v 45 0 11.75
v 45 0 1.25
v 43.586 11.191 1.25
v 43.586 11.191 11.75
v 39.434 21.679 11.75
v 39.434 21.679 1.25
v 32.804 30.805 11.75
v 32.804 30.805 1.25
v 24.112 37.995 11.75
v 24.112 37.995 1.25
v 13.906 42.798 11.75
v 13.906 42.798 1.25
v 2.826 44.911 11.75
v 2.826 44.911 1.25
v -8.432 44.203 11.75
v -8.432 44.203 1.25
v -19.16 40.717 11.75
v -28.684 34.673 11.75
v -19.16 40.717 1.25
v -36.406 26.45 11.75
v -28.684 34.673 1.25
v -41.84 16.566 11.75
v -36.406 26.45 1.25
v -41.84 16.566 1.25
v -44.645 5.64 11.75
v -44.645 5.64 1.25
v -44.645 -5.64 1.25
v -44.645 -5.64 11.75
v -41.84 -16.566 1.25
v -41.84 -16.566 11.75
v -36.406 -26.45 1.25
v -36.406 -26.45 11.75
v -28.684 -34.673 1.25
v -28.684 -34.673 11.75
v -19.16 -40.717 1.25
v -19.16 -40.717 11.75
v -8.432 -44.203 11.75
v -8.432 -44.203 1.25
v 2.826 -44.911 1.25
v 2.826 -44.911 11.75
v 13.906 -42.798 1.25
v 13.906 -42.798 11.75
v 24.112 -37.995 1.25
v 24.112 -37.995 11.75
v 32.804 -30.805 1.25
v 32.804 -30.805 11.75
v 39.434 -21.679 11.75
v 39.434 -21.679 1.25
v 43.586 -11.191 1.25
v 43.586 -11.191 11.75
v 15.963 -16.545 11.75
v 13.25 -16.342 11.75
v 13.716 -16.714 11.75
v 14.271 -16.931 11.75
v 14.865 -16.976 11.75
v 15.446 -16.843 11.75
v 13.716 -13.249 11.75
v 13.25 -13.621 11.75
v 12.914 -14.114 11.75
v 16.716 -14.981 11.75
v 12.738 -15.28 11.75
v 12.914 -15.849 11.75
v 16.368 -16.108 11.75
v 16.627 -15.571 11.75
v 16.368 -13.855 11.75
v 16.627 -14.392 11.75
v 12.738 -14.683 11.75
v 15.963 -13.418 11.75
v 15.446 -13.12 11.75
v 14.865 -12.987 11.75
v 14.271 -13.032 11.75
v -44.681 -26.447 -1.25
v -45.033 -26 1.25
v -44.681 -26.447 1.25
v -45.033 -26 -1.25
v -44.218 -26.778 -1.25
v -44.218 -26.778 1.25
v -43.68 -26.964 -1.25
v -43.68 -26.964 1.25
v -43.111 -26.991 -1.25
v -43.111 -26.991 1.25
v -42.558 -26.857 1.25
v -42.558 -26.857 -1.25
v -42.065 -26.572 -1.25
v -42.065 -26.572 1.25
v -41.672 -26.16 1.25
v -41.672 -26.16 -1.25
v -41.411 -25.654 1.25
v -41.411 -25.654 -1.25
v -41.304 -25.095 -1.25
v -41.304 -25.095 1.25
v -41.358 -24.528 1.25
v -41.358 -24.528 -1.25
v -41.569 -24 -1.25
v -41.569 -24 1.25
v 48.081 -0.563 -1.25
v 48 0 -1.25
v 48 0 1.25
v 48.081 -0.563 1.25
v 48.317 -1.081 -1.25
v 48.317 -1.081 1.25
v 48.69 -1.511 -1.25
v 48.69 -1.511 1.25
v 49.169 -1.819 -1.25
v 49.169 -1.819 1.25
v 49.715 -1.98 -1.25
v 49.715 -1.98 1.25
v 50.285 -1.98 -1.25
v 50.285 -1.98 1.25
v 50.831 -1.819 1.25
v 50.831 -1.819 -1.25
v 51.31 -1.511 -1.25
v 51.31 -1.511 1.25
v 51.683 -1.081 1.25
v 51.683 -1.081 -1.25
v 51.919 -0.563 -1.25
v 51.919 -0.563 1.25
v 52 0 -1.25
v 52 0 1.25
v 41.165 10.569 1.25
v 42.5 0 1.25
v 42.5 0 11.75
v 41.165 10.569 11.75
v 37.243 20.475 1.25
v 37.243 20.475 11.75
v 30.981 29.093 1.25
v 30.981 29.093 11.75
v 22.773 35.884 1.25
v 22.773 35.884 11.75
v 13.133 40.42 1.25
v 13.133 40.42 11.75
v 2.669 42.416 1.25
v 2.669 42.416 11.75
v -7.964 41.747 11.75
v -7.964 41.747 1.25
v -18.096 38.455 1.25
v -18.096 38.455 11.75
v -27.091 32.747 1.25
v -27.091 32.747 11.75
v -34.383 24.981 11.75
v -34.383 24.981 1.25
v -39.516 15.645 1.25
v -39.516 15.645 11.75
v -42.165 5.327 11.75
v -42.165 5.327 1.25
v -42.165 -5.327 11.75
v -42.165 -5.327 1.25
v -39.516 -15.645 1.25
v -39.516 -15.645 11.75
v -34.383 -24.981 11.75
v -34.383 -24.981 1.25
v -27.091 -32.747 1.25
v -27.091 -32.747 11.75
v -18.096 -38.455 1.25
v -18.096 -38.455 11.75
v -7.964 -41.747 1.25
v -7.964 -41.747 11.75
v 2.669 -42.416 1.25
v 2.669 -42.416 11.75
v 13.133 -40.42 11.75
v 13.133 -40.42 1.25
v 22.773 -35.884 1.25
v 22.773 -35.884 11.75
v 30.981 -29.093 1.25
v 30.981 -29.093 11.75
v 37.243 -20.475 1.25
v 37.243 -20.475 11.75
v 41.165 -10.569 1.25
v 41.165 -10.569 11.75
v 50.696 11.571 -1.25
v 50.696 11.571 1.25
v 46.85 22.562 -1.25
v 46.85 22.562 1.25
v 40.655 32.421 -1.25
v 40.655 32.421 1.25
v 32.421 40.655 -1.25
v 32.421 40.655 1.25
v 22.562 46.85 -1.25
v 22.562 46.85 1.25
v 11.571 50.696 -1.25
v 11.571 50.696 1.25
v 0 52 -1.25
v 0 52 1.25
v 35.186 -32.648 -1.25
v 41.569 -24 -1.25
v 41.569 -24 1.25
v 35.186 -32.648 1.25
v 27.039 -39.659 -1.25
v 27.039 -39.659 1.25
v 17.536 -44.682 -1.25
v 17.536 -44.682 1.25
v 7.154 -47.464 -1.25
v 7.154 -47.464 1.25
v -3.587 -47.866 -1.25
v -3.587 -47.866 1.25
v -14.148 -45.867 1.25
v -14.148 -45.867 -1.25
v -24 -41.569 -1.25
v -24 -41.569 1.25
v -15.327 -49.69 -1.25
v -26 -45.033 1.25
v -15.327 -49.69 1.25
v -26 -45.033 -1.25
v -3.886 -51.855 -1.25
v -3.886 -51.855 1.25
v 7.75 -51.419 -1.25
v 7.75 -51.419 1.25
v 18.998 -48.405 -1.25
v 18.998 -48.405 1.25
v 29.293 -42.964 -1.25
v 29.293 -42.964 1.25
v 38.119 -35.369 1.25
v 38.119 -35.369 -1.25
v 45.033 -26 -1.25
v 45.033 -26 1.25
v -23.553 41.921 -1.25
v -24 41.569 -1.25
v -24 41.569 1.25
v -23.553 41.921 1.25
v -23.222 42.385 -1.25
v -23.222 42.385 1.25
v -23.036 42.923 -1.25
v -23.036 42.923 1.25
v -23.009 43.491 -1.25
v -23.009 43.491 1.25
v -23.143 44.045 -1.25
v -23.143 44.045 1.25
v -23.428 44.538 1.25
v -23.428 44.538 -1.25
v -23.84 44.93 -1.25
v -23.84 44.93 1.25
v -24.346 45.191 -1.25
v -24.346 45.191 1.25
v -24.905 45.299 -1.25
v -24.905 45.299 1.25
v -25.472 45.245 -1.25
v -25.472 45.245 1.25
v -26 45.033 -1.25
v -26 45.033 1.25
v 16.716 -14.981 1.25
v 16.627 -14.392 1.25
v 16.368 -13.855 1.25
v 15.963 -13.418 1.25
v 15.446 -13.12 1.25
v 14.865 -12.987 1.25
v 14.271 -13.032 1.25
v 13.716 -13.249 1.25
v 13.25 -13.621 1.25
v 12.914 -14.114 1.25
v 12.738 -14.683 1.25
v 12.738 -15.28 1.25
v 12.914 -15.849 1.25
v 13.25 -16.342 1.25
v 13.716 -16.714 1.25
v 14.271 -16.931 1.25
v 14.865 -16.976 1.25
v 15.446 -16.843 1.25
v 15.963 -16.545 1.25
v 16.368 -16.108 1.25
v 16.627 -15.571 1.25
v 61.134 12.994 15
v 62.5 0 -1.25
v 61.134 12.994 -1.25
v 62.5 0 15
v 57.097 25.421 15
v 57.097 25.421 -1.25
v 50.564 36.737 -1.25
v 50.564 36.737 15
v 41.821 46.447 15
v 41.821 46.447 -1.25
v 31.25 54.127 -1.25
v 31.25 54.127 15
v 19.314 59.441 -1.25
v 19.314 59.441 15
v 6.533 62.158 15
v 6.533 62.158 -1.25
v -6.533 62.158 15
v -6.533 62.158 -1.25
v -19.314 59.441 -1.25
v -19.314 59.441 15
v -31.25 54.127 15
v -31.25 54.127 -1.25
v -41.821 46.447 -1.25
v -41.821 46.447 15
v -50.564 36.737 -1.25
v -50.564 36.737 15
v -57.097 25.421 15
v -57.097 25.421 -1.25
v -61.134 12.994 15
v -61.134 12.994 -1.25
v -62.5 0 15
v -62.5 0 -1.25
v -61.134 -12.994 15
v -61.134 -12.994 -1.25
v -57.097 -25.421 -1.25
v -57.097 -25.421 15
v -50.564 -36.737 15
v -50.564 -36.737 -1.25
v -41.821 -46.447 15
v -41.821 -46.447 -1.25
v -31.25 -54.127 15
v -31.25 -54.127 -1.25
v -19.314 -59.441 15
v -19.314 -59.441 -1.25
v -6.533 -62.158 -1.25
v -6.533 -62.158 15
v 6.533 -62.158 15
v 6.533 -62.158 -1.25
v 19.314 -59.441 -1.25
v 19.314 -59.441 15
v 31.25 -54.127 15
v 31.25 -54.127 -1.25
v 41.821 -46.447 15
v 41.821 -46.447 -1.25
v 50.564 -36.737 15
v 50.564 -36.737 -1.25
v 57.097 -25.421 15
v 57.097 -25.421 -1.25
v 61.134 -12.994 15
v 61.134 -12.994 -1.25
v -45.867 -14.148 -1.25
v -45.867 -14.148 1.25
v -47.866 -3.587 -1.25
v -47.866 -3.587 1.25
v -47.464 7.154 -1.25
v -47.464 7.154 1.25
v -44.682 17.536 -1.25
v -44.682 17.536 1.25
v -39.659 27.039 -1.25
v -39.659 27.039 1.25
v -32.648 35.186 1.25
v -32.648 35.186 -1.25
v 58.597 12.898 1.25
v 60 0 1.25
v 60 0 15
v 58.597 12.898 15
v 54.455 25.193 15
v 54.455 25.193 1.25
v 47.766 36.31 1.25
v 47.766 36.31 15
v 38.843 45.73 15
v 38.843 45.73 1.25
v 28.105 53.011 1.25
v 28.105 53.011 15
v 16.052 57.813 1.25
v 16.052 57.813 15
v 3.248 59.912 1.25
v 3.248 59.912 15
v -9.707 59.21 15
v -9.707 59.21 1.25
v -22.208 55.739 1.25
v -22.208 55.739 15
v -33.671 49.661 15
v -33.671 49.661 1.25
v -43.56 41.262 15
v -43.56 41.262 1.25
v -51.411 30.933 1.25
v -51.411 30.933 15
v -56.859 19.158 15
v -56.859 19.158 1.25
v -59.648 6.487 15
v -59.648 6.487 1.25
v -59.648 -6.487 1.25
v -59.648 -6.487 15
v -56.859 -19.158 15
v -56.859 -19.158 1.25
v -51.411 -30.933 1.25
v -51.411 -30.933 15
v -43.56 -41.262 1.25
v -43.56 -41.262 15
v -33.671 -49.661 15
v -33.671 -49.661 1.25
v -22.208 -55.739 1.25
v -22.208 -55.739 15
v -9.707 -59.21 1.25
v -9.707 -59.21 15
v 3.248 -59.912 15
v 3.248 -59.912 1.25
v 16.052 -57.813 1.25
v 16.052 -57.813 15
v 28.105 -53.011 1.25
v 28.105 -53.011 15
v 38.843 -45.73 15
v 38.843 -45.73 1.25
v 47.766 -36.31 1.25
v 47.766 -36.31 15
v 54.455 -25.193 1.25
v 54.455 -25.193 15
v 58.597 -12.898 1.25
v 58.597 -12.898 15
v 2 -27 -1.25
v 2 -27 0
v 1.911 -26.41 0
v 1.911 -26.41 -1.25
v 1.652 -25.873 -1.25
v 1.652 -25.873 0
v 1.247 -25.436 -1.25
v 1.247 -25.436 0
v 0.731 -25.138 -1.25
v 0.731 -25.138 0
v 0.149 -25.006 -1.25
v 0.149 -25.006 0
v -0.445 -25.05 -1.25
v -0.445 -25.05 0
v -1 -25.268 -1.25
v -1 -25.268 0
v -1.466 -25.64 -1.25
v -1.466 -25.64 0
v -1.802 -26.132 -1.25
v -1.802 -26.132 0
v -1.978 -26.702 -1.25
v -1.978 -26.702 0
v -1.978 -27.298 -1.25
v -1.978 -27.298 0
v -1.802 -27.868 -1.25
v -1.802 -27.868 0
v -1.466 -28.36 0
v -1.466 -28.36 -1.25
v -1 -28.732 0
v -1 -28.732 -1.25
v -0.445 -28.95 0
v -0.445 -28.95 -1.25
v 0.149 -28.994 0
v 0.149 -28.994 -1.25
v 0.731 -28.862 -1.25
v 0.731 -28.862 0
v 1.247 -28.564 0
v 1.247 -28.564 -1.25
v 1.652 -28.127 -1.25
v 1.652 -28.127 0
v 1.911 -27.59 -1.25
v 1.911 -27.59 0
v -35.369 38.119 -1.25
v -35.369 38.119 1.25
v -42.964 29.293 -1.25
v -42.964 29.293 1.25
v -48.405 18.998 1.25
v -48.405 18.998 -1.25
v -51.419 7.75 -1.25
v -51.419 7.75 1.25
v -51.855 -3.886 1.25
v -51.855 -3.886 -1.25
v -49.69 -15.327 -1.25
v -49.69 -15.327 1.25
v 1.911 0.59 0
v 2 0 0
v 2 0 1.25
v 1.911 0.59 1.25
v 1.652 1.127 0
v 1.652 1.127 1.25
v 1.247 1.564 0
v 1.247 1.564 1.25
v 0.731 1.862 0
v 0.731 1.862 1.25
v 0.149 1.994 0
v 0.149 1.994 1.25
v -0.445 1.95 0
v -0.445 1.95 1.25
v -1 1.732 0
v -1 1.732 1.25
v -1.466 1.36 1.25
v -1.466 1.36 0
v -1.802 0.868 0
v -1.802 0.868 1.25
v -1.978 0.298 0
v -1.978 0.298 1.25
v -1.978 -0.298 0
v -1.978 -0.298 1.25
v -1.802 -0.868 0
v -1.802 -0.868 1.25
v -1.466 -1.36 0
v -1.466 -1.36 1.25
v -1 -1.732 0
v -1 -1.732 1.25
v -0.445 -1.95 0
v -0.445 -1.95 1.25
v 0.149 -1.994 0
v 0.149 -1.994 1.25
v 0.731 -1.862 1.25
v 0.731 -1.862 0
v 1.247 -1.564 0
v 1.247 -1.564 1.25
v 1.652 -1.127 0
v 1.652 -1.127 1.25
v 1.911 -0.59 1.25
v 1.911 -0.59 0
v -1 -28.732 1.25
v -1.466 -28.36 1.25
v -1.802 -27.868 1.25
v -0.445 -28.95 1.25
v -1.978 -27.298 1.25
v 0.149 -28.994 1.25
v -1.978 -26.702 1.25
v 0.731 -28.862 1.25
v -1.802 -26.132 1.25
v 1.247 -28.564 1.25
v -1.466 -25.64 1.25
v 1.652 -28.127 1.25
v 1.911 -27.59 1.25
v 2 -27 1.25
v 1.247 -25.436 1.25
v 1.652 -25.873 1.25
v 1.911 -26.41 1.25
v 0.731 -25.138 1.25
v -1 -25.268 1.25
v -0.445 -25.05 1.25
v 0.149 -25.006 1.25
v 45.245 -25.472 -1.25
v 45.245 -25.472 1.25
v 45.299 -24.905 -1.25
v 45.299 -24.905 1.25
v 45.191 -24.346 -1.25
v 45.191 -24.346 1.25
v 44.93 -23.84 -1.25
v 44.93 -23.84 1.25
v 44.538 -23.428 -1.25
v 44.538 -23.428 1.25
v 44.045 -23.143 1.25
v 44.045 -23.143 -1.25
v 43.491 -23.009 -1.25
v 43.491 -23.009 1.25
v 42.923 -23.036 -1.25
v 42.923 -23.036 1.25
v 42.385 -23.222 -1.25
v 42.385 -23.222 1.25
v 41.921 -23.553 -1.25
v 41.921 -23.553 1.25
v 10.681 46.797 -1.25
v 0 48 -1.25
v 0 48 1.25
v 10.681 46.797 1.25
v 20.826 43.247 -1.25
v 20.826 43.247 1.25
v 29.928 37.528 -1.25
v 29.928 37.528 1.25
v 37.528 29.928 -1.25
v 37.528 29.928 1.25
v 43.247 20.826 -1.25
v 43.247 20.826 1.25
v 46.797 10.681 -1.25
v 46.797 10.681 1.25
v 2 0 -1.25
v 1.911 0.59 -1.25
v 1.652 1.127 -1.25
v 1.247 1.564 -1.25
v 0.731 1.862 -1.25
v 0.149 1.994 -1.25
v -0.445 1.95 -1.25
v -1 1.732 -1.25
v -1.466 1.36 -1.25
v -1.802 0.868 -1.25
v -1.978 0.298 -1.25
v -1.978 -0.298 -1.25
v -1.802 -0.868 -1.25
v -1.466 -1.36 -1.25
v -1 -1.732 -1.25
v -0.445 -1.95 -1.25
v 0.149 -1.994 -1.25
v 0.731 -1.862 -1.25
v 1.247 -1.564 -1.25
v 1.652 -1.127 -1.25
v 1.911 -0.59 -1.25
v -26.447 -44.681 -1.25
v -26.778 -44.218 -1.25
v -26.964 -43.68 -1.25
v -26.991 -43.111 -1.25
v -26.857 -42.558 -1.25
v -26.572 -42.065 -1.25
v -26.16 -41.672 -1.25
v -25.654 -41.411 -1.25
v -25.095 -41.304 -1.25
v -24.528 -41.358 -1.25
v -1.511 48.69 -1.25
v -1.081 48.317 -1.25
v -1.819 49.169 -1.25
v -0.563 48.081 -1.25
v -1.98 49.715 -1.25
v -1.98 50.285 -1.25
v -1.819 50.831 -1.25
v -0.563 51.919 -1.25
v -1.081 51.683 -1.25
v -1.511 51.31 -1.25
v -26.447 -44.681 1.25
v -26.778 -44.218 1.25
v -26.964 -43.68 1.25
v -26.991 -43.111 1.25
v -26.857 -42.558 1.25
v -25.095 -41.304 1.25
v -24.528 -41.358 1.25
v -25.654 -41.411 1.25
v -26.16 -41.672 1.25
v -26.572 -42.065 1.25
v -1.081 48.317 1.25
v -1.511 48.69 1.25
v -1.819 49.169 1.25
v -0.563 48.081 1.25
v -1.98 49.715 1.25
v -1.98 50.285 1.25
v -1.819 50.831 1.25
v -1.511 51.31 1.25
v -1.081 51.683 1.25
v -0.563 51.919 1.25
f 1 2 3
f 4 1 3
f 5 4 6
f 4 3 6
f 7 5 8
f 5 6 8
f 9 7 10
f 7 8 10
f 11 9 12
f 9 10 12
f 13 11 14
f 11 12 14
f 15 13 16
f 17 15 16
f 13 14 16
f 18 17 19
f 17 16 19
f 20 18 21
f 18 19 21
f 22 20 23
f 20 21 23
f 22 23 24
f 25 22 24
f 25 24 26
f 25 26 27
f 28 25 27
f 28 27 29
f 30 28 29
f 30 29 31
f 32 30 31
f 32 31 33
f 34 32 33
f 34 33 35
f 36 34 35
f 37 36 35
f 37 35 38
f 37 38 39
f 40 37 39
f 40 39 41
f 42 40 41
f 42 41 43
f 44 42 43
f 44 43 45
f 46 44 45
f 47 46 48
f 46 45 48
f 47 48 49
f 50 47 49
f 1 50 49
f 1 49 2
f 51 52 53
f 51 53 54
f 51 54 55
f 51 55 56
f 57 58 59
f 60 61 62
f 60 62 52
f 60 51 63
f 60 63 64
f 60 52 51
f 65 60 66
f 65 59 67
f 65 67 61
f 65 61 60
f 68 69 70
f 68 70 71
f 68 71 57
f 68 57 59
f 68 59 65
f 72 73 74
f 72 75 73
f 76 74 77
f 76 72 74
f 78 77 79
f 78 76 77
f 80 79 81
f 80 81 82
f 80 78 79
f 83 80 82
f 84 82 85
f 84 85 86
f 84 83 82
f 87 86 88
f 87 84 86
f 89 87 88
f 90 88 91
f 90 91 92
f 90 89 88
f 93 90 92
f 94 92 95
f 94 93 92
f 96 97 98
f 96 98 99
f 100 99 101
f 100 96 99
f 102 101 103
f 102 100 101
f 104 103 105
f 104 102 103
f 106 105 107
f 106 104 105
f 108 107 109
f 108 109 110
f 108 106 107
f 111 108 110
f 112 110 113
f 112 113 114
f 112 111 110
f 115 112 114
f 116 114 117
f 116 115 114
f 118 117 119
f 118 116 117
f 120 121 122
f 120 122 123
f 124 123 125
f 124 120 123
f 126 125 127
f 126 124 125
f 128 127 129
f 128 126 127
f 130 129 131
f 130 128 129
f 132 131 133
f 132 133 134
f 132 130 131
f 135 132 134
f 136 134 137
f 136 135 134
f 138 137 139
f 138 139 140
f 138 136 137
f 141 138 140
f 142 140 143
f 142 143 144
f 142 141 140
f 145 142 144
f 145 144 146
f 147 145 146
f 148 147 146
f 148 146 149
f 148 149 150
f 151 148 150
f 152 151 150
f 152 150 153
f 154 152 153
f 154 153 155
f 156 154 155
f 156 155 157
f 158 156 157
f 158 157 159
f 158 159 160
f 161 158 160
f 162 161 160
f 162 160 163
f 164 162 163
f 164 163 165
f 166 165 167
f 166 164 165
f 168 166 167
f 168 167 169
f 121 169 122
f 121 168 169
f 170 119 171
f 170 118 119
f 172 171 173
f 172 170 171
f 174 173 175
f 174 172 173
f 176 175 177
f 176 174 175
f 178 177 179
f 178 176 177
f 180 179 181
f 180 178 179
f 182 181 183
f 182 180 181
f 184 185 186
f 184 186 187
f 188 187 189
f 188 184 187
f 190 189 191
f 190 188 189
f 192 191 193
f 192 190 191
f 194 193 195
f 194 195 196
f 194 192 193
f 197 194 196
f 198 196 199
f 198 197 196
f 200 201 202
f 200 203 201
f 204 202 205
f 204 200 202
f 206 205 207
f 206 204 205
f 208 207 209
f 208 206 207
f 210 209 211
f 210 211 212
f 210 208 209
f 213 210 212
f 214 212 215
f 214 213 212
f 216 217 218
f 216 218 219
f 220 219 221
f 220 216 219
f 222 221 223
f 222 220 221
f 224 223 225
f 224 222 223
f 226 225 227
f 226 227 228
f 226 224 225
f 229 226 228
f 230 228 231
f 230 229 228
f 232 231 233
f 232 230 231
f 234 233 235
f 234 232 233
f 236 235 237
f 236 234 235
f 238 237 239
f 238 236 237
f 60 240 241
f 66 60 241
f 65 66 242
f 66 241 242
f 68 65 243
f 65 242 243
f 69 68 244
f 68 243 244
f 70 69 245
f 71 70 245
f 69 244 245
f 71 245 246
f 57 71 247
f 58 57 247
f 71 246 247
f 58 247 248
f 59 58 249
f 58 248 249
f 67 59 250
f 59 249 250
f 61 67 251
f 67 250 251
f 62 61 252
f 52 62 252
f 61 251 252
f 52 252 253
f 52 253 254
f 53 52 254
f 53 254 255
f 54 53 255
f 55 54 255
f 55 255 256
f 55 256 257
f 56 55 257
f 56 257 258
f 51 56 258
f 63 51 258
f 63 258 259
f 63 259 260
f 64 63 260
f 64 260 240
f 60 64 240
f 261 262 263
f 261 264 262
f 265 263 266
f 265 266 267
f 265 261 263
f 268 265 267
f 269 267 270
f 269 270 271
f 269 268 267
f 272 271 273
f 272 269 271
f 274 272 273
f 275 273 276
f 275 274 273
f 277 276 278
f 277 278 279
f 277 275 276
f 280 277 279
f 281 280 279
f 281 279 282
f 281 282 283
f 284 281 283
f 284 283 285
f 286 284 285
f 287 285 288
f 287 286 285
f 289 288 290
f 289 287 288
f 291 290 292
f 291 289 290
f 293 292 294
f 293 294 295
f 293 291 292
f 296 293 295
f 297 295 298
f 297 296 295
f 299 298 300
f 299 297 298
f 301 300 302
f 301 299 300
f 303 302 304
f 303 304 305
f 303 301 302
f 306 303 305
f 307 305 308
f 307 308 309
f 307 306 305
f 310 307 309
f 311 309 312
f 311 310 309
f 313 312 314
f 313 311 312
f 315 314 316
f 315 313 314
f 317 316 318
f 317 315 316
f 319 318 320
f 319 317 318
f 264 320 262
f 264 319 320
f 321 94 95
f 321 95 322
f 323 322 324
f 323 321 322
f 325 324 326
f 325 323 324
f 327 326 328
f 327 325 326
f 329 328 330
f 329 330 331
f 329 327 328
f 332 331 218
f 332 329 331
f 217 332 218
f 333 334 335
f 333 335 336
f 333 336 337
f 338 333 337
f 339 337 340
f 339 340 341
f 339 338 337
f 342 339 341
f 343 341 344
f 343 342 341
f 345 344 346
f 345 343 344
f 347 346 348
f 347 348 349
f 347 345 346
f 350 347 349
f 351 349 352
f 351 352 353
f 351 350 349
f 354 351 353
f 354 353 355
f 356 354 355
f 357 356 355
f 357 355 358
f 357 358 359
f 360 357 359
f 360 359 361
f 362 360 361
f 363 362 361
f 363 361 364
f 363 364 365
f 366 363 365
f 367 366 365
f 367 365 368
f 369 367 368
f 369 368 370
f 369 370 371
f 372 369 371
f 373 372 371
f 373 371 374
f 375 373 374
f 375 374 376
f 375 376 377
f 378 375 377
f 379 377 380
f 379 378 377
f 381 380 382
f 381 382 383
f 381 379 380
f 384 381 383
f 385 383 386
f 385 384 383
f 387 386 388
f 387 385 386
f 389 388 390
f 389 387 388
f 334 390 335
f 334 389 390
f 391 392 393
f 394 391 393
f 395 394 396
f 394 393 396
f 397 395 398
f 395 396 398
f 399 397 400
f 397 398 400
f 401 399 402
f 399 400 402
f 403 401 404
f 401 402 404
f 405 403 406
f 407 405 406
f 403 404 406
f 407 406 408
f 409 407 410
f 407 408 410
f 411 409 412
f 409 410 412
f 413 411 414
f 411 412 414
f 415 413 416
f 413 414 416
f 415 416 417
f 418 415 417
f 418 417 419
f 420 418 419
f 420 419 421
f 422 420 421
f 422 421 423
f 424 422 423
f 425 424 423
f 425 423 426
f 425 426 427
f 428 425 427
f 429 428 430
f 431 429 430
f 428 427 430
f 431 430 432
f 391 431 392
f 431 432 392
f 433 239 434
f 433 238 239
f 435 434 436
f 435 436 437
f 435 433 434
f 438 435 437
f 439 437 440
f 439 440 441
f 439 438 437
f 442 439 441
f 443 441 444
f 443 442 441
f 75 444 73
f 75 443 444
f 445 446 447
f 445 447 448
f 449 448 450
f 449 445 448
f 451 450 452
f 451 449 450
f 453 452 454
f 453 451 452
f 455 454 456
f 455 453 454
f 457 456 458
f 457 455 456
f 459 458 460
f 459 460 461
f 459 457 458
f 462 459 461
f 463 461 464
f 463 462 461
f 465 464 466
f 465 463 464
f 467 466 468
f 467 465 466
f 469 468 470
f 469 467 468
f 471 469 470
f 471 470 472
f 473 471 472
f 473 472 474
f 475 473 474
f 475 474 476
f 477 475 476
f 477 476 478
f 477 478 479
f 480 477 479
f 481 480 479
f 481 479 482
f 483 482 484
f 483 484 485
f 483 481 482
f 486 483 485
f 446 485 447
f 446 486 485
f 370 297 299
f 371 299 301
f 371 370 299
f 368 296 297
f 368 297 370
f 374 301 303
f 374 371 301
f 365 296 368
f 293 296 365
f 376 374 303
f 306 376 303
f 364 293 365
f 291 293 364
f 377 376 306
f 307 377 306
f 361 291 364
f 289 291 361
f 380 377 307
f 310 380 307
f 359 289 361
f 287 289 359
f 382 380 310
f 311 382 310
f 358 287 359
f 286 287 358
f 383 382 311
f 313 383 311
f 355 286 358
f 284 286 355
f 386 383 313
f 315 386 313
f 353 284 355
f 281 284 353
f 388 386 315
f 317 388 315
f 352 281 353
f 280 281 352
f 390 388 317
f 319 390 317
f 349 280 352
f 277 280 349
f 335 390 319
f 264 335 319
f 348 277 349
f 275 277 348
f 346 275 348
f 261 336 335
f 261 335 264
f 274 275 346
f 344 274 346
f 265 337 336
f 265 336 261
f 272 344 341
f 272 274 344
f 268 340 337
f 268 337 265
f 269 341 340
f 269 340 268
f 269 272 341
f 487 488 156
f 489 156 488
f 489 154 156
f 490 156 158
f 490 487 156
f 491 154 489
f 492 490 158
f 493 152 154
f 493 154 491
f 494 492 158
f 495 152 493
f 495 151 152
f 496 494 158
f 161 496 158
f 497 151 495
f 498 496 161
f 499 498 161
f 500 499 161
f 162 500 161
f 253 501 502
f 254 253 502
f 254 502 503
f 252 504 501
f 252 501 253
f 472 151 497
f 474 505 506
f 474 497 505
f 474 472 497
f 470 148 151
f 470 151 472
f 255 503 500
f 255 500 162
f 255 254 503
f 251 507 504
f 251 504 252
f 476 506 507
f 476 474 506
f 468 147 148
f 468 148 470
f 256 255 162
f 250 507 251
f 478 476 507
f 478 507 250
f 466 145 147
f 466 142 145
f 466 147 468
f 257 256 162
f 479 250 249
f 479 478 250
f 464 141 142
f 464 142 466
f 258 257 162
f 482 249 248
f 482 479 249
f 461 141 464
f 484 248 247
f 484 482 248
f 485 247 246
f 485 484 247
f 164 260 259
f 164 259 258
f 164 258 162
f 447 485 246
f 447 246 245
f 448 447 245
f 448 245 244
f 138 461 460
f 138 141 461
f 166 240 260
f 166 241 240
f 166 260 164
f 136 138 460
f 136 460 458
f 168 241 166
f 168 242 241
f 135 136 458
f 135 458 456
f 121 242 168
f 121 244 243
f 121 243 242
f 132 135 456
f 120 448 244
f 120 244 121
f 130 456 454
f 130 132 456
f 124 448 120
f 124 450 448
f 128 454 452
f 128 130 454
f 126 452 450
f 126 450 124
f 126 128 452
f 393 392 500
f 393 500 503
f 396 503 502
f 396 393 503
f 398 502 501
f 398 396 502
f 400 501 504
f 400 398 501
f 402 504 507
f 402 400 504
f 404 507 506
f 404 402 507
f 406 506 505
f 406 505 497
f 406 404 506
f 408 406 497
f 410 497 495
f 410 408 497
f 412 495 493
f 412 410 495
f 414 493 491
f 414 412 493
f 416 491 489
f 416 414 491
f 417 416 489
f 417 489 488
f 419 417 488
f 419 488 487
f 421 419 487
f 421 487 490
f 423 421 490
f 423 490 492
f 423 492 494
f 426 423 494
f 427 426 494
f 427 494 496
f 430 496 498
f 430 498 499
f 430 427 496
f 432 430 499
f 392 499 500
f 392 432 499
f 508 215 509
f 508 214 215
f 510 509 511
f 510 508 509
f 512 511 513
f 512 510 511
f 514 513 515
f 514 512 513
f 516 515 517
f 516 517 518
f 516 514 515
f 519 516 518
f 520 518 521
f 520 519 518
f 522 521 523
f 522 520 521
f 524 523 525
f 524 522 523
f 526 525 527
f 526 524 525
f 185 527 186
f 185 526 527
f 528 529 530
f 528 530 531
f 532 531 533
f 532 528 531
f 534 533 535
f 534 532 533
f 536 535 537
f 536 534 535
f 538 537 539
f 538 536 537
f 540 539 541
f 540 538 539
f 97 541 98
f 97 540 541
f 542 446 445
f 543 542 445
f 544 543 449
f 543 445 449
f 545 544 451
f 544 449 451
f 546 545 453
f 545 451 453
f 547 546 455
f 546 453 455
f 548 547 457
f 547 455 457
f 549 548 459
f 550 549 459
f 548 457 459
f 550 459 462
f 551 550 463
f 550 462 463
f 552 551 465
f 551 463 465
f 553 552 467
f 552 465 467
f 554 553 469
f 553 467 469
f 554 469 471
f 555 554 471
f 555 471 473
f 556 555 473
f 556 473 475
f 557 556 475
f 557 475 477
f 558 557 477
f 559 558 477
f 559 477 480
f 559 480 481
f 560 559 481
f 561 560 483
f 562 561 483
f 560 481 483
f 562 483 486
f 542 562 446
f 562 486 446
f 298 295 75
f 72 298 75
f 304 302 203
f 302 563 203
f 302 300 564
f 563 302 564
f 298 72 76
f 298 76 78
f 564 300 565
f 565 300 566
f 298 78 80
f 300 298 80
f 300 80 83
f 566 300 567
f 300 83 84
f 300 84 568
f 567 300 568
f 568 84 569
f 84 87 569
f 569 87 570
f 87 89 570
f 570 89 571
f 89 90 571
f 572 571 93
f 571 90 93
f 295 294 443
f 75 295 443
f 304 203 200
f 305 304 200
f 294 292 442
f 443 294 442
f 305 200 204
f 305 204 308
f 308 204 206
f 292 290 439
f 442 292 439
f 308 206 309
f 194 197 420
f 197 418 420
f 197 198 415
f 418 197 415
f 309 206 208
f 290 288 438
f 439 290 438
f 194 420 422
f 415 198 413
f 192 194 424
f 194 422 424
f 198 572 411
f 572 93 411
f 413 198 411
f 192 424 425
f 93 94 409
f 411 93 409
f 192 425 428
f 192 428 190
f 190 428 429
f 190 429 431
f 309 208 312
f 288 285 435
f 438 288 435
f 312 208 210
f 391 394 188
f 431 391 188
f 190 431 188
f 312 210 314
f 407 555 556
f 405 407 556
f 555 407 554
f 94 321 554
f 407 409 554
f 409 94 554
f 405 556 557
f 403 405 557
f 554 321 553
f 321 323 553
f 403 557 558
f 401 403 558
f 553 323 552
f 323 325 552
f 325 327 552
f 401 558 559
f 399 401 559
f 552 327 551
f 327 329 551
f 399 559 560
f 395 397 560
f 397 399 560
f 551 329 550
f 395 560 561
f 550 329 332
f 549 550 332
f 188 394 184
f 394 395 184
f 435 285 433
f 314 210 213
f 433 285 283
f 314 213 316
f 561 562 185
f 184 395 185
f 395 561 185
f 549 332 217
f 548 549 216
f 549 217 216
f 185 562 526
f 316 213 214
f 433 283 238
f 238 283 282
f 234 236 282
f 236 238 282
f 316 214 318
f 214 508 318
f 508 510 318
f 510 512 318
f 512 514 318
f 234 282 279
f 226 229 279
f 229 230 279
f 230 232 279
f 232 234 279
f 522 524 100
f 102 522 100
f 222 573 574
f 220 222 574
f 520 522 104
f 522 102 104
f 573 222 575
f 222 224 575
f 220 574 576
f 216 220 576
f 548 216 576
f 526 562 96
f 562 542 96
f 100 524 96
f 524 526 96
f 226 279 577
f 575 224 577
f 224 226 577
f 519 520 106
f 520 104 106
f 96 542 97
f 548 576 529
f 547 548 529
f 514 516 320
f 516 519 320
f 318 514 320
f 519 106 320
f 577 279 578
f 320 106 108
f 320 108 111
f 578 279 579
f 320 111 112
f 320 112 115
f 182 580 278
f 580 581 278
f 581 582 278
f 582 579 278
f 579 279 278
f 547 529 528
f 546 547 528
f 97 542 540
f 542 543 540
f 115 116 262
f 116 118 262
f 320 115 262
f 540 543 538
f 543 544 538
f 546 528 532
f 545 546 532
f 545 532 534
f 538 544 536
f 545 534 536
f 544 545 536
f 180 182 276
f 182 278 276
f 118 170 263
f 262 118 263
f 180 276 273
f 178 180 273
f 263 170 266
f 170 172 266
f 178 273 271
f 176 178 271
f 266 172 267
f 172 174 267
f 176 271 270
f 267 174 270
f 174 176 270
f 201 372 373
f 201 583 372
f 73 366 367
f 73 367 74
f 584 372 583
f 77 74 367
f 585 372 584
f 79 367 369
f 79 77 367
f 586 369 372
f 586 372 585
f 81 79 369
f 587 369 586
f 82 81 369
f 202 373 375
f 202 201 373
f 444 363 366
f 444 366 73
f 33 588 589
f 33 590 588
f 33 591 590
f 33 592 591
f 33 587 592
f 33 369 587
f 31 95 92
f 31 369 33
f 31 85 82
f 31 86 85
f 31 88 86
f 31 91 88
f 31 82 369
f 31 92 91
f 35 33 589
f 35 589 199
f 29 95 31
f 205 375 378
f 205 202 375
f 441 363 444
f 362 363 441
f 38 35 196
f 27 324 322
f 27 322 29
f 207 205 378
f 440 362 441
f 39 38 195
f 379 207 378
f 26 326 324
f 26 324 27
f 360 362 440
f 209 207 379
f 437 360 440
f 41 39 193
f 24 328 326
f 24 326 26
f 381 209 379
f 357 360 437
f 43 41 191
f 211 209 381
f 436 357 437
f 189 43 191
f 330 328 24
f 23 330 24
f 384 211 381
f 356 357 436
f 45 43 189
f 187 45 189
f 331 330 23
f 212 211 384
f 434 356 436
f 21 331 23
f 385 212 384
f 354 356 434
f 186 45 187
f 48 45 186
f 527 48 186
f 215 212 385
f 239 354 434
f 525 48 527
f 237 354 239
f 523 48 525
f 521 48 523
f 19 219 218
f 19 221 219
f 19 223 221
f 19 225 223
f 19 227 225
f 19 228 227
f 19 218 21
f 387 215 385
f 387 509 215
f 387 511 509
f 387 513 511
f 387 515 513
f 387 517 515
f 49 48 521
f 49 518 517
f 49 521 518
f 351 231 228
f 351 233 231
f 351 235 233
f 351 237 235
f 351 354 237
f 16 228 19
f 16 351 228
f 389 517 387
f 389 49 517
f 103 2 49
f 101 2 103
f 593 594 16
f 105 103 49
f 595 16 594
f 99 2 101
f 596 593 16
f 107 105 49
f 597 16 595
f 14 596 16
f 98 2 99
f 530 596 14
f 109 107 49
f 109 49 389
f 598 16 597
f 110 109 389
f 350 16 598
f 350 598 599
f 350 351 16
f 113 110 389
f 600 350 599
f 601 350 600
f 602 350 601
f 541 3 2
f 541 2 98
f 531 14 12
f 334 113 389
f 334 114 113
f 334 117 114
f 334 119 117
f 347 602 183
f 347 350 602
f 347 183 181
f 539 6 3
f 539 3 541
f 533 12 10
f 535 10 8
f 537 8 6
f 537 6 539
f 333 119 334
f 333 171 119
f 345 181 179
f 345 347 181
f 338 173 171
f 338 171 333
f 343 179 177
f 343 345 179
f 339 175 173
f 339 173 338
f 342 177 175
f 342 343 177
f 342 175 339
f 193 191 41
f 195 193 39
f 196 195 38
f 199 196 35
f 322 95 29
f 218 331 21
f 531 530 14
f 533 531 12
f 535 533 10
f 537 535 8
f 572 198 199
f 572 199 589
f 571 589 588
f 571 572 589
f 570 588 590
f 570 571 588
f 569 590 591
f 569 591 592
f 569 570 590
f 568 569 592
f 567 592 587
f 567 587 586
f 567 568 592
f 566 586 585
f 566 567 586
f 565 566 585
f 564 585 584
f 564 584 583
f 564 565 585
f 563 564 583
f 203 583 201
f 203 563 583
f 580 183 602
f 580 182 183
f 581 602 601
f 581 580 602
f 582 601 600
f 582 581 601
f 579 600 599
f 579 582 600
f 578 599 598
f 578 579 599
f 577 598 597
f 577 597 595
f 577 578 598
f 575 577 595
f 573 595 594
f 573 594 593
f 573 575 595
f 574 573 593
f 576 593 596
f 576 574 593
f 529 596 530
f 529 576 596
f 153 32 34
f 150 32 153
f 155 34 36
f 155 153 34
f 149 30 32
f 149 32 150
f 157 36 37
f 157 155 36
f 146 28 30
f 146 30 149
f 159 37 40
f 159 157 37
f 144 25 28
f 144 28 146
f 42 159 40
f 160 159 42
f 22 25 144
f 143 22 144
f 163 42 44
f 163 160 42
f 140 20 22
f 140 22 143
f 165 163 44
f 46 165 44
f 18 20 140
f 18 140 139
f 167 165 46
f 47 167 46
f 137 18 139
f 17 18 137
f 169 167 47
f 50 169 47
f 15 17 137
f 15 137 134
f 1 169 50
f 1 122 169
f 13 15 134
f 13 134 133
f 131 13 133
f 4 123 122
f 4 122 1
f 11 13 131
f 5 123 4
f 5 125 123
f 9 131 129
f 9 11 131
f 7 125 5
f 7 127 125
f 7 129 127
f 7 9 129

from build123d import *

# Parameters (mm, degrees)
BOSS_EXTRUDE1_DEPTH      = 1.25
BOSS_EXTRUDE1_DEPTH_BACK = 1.25
SKETCH1_R                = 60
SKETCH1_R_2              = 2
SKETCH1_3_R              = 45
SKETCH1_3_R_2            = 42.5
SKETCH1_3_R_3            = 2
BOSS_EXTRUDE2_DEPTH      = 11.75
BOSS_EXTRUDE3_DEPTH      = 15
BOSS_EXTRUDE3_DEPTH_BACK = 1.25
SKETCH1_4_R              = 62.5
SKETCH1_4_R_2            = 60


with BuildPart() as part:
    # Sketch1 → Boss-Extrude1 (new, two sides: drawn at the far end of the back side and taken through both)
    with BuildSketch(Plane.XY.offset(-BOSS_EXTRUDE1_DEPTH_BACK)):
        Circle(SKETCH1_R)
        with BuildLine():
            ThreePointArc((45.033320997, -26), (13.458590345, -50.228142967), (-26, -45.033320997))
            ThreePointArc((-26, -45.033320997), (-26.732050808, -42.301270189), (-24, -41.569219382))
            ThreePointArc((-24, -41.569219382), (12.423314165, -46.364439662), (41.569219382, -24))
            ThreePointArc((41.569219382, -24), (44.301270189, -23.267949192), (45.033320997, -26))
        make_face(mode=Mode.SUBTRACT)
        with BuildLine():
            ThreePointArc((-45.033320997, -26), (-50.228142967, 13.458590345), (-26, 45.033320997))
            ThreePointArc((-26, 45.033320997), (-23.267949192, 44.301270189), (-24, 41.569219382))
            ThreePointArc((-24, 41.569219382), (-46.364439662, 12.423314165), (-41.569219382, -24))
            ThreePointArc((-41.569219382, -24), (-42.301270189, -26.732050808), (-45.033320997, -26))
        make_face(mode=Mode.SUBTRACT)
        with BuildLine():
            ThreePointArc((0, 52), (36.769552622, 36.769552622), (52, 0))
            ThreePointArc((52, 0), (50, -2), (48, 0))
            ThreePointArc((48, 0), (33.941125497, 33.941125497), (0, 48))
            ThreePointArc((0, 48), (-2, 50), (0, 52))
        make_face(mode=Mode.SUBTRACT)
        Circle(SKETCH1_R_2, mode=Mode.SUBTRACT)
        with Locations((0, -27)):
            Circle(SKETCH1_R_2, mode=Mode.SUBTRACT)
    extrude(amount=BOSS_EXTRUDE1_DEPTH + BOSS_EXTRUDE1_DEPTH_BACK)

    # Sketch1<3> → Boss-Extrude2 (add)
    # profile 1 of 2: a face of its own
    with BuildSketch(Plane.XY):
        Circle(SKETCH1_3_R)
        Circle(SKETCH1_3_R_2, mode=Mode.SUBTRACT)
    # profile 2 of 2: a face of its own
    with BuildSketch(Plane.XY):
        with Locations((14.715815051, -14.981481481)):
            Circle(SKETCH1_3_R_3)
    extrude(amount=BOSS_EXTRUDE2_DEPTH)

    # Sketch1<4> → Boss-Extrude3 (add, two sides: drawn at the far end of the back side and taken through both)
    with BuildSketch(Plane.XY.offset(-BOSS_EXTRUDE3_DEPTH_BACK)):
        Circle(SKETCH1_4_R)
        Circle(SKETCH1_4_R_2, mode=Mode.SUBTRACT)
    extrude(amount=BOSS_EXTRUDE3_DEPTH + BOSS_EXTRUDE3_DEPTH_BACK)


solid = part.part
